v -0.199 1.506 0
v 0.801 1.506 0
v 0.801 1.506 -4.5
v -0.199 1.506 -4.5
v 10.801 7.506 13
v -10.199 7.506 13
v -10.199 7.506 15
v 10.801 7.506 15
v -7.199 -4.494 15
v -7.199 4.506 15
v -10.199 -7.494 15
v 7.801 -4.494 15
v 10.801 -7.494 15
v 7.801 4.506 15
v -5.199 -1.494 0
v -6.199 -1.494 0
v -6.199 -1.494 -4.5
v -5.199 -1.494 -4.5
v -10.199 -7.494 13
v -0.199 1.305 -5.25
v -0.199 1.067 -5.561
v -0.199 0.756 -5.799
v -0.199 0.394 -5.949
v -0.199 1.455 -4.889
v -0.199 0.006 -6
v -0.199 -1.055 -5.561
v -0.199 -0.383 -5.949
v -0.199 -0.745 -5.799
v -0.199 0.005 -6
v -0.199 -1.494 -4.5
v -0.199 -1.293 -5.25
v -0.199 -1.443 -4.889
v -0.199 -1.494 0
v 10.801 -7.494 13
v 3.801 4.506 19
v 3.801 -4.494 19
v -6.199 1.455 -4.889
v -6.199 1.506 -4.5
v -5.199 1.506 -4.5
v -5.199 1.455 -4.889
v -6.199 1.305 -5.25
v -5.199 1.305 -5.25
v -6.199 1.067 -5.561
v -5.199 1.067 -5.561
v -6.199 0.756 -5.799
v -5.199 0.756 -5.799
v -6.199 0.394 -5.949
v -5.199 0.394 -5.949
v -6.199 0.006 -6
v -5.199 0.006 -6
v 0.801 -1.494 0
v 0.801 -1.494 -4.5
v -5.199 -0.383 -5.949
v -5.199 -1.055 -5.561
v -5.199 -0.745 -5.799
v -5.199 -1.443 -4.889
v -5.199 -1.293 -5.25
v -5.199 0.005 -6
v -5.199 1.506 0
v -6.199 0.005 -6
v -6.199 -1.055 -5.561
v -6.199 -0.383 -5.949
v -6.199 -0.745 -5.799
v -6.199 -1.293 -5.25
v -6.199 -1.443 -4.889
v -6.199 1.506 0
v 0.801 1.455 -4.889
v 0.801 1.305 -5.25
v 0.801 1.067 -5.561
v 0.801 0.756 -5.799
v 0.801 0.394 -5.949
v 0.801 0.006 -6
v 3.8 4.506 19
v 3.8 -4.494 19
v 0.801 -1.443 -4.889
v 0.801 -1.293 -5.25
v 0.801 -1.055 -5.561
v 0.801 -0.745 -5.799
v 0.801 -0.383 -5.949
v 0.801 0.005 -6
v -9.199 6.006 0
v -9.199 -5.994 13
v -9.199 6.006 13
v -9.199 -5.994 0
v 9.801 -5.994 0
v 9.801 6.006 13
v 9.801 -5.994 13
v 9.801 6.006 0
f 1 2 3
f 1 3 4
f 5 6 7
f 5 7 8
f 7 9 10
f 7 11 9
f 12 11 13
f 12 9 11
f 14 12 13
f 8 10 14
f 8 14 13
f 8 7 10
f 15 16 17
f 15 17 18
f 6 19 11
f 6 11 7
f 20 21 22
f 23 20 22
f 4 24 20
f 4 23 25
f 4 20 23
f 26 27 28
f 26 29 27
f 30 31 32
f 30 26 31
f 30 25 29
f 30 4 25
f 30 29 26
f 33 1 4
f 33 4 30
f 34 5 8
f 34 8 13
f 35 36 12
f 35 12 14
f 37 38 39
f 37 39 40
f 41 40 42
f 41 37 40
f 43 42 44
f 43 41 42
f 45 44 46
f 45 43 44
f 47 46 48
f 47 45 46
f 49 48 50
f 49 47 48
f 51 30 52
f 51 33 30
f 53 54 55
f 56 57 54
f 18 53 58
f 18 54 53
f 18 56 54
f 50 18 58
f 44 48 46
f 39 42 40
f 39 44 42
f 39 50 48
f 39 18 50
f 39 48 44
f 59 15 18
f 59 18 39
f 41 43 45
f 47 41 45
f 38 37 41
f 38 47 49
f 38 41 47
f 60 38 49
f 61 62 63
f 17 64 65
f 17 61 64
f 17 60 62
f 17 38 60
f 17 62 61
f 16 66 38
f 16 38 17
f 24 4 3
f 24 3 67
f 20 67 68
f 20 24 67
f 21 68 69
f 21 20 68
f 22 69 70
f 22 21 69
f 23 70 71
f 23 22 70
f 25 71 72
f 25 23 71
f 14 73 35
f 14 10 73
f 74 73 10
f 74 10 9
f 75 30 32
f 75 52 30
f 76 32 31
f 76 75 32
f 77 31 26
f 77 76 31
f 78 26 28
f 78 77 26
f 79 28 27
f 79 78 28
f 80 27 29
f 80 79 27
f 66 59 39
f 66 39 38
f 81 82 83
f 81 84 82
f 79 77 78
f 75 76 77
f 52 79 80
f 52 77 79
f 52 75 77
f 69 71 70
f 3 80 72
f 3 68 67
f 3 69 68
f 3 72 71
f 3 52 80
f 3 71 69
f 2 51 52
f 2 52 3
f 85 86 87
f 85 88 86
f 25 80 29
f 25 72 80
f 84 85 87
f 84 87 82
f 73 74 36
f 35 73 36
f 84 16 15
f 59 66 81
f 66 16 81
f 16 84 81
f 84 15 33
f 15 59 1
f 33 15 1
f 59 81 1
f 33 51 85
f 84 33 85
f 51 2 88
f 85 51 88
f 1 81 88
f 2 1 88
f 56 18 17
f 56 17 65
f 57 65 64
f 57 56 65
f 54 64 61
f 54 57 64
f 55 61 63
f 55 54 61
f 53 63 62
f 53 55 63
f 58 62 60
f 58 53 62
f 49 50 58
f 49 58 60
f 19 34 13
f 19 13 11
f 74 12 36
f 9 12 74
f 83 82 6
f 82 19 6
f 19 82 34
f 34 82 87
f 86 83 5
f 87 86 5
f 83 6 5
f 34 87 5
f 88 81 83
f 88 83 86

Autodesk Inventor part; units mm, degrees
ref_plane "YZ Plane" through (0, 0, 0) normal (1, 0, 0) x (0, 1, 0)
ref_plane "XZ Plane" through (0, 0, 0) normal (0, 1, 0) x (-1, 0, 0)
ref_plane "XY Plane" through (0, 0, 0) normal (0, 0, 1) x (1, 0, 0)
sketch "スケッチ1" plane through (0, 0, 0) normal (0, 0, 1) x (1, 0, 0)
  line L0 (-9.1992, 6.0057) -> (9.8008, 6.0057)
  line L1 (9.8008, 6.0057) -> (9.8008, -5.9943)
  line L2 (9.8008, -5.9943) -> (-9.1992, -5.9943)
  line L3 (-9.1992, -5.9943) -> (-9.1992, 6.0057)
  dimension "d0" = 19
  dimension "d1" = 12
extrude "押し出し1" add sketch "スケッチ1" along normal blind 13
sketch "スケッチ2" plane through (0, 0, 13) normal (0, 0, 1) x (1, 0, 0)
  line L0 (-9.1992, 6.0057) -> (9.8008, 6.0057) projected
  line L1 (-9.1992, -5.9943) -> (-9.1992, 6.0057) projected
  line L2 (-10.1992, 7.5057) -> (10.8008, 7.5057)
  line L3 (10.8008, 7.5057) -> (10.8008, -7.4943)
  line L4 (10.8008, -7.4943) -> (-10.1992, -7.4943)
  line L5 (-10.1992, -7.4943) -> (-10.1992, 7.5057)
  dimension "d4" = 21
  dimension "d5" = 15
  dimension "d6" = 1.5
  dimension "d7" = 1
extrude "押し出し2" add sketch "スケッチ2" along normal blind 2
sketch "スケッチ3" plane through (0, 0, 15) normal (0, 0, 1) x (1, 0, 0)
  line L0 (-10.1992, 7.5057) -> (10.8008, 7.5057) projected
  line L1 (-10.1992, -7.4943) -> (-10.1992, 7.5057) projected
  line L2 (-7.1992, 4.5057) -> (7.8008, 4.5057)
  line L3 (7.8008, 4.5057) -> (7.8008, -4.4943)
  line L4 (7.8008, -4.4943) -> (-7.1992, -4.4943)
  line L5 (-7.1992, -4.4943) -> (-7.1992, 4.5057)
  dimension "d10" = 9
  dimension "d11" = 15
  dimension "d12" = 3
  dimension "d13" = 3
extrude "押し出し3" add sketch "スケッチ3" along normal blind 4
chamfer "面取り1" distance 4 distance2 11 1 edges at (-7.1992, 0.0057, 19) measured on face at (-7.1992, -1.4943, 16.3333)
chamfer "面取り2" distance 4 distance2 4 1 edges at (7.8008, 0.0057, 19) measured on face at (7.8008, 1.5057, 16.3333)
sketch "スケッチ4" plane through (0, 0, 0) normal (0, 0, -1) x (-1, 0, 0)
  line L0 (9.1992, 6.0057) -> (-9.8008, 6.0057) projected
  line L1 (9.1992, -5.9943) -> (9.1992, 6.0057) projected
  line L2 (-0.8008, 1.5057) -> (0.1992, 1.5057)
  line L3 (0.1992, 1.5057) -> (0.1992, -1.4943)
  line L4 (0.1992, -1.4943) -> (-0.8008, -1.4943)
  line L5 (-0.8008, -1.4943) -> (-0.8008, 1.5057)
  line L6 (5.1992, 1.5057) -> (6.1992, 1.5057)
  line L7 (6.1992, 1.5057) -> (6.1992, -1.4943)
  line L8 (6.1992, -1.4943) -> (5.1992, -1.4943)
  line L9 (5.1992, -1.4943) -> (5.1992, 1.5057)
  dimension "d20" = 9
  dimension "d21" = 1
  dimension "d22" = 3
  dimension "d23" = 4.5
  dimension "d24" = 1
  dimension "d25" = 5
extrude "押し出し4" add sketch "スケッチ4" along normal blind 6
fillet "フィレット1" radius 1.5 4 edges at (0.3008, 1.5057, -6) (0.3008, -1.4943, -6) (-5.6992, -1.4943, -6) (-5.6992, 1.5057, -6)
properties part number "sw" material "ABS Plastic"
